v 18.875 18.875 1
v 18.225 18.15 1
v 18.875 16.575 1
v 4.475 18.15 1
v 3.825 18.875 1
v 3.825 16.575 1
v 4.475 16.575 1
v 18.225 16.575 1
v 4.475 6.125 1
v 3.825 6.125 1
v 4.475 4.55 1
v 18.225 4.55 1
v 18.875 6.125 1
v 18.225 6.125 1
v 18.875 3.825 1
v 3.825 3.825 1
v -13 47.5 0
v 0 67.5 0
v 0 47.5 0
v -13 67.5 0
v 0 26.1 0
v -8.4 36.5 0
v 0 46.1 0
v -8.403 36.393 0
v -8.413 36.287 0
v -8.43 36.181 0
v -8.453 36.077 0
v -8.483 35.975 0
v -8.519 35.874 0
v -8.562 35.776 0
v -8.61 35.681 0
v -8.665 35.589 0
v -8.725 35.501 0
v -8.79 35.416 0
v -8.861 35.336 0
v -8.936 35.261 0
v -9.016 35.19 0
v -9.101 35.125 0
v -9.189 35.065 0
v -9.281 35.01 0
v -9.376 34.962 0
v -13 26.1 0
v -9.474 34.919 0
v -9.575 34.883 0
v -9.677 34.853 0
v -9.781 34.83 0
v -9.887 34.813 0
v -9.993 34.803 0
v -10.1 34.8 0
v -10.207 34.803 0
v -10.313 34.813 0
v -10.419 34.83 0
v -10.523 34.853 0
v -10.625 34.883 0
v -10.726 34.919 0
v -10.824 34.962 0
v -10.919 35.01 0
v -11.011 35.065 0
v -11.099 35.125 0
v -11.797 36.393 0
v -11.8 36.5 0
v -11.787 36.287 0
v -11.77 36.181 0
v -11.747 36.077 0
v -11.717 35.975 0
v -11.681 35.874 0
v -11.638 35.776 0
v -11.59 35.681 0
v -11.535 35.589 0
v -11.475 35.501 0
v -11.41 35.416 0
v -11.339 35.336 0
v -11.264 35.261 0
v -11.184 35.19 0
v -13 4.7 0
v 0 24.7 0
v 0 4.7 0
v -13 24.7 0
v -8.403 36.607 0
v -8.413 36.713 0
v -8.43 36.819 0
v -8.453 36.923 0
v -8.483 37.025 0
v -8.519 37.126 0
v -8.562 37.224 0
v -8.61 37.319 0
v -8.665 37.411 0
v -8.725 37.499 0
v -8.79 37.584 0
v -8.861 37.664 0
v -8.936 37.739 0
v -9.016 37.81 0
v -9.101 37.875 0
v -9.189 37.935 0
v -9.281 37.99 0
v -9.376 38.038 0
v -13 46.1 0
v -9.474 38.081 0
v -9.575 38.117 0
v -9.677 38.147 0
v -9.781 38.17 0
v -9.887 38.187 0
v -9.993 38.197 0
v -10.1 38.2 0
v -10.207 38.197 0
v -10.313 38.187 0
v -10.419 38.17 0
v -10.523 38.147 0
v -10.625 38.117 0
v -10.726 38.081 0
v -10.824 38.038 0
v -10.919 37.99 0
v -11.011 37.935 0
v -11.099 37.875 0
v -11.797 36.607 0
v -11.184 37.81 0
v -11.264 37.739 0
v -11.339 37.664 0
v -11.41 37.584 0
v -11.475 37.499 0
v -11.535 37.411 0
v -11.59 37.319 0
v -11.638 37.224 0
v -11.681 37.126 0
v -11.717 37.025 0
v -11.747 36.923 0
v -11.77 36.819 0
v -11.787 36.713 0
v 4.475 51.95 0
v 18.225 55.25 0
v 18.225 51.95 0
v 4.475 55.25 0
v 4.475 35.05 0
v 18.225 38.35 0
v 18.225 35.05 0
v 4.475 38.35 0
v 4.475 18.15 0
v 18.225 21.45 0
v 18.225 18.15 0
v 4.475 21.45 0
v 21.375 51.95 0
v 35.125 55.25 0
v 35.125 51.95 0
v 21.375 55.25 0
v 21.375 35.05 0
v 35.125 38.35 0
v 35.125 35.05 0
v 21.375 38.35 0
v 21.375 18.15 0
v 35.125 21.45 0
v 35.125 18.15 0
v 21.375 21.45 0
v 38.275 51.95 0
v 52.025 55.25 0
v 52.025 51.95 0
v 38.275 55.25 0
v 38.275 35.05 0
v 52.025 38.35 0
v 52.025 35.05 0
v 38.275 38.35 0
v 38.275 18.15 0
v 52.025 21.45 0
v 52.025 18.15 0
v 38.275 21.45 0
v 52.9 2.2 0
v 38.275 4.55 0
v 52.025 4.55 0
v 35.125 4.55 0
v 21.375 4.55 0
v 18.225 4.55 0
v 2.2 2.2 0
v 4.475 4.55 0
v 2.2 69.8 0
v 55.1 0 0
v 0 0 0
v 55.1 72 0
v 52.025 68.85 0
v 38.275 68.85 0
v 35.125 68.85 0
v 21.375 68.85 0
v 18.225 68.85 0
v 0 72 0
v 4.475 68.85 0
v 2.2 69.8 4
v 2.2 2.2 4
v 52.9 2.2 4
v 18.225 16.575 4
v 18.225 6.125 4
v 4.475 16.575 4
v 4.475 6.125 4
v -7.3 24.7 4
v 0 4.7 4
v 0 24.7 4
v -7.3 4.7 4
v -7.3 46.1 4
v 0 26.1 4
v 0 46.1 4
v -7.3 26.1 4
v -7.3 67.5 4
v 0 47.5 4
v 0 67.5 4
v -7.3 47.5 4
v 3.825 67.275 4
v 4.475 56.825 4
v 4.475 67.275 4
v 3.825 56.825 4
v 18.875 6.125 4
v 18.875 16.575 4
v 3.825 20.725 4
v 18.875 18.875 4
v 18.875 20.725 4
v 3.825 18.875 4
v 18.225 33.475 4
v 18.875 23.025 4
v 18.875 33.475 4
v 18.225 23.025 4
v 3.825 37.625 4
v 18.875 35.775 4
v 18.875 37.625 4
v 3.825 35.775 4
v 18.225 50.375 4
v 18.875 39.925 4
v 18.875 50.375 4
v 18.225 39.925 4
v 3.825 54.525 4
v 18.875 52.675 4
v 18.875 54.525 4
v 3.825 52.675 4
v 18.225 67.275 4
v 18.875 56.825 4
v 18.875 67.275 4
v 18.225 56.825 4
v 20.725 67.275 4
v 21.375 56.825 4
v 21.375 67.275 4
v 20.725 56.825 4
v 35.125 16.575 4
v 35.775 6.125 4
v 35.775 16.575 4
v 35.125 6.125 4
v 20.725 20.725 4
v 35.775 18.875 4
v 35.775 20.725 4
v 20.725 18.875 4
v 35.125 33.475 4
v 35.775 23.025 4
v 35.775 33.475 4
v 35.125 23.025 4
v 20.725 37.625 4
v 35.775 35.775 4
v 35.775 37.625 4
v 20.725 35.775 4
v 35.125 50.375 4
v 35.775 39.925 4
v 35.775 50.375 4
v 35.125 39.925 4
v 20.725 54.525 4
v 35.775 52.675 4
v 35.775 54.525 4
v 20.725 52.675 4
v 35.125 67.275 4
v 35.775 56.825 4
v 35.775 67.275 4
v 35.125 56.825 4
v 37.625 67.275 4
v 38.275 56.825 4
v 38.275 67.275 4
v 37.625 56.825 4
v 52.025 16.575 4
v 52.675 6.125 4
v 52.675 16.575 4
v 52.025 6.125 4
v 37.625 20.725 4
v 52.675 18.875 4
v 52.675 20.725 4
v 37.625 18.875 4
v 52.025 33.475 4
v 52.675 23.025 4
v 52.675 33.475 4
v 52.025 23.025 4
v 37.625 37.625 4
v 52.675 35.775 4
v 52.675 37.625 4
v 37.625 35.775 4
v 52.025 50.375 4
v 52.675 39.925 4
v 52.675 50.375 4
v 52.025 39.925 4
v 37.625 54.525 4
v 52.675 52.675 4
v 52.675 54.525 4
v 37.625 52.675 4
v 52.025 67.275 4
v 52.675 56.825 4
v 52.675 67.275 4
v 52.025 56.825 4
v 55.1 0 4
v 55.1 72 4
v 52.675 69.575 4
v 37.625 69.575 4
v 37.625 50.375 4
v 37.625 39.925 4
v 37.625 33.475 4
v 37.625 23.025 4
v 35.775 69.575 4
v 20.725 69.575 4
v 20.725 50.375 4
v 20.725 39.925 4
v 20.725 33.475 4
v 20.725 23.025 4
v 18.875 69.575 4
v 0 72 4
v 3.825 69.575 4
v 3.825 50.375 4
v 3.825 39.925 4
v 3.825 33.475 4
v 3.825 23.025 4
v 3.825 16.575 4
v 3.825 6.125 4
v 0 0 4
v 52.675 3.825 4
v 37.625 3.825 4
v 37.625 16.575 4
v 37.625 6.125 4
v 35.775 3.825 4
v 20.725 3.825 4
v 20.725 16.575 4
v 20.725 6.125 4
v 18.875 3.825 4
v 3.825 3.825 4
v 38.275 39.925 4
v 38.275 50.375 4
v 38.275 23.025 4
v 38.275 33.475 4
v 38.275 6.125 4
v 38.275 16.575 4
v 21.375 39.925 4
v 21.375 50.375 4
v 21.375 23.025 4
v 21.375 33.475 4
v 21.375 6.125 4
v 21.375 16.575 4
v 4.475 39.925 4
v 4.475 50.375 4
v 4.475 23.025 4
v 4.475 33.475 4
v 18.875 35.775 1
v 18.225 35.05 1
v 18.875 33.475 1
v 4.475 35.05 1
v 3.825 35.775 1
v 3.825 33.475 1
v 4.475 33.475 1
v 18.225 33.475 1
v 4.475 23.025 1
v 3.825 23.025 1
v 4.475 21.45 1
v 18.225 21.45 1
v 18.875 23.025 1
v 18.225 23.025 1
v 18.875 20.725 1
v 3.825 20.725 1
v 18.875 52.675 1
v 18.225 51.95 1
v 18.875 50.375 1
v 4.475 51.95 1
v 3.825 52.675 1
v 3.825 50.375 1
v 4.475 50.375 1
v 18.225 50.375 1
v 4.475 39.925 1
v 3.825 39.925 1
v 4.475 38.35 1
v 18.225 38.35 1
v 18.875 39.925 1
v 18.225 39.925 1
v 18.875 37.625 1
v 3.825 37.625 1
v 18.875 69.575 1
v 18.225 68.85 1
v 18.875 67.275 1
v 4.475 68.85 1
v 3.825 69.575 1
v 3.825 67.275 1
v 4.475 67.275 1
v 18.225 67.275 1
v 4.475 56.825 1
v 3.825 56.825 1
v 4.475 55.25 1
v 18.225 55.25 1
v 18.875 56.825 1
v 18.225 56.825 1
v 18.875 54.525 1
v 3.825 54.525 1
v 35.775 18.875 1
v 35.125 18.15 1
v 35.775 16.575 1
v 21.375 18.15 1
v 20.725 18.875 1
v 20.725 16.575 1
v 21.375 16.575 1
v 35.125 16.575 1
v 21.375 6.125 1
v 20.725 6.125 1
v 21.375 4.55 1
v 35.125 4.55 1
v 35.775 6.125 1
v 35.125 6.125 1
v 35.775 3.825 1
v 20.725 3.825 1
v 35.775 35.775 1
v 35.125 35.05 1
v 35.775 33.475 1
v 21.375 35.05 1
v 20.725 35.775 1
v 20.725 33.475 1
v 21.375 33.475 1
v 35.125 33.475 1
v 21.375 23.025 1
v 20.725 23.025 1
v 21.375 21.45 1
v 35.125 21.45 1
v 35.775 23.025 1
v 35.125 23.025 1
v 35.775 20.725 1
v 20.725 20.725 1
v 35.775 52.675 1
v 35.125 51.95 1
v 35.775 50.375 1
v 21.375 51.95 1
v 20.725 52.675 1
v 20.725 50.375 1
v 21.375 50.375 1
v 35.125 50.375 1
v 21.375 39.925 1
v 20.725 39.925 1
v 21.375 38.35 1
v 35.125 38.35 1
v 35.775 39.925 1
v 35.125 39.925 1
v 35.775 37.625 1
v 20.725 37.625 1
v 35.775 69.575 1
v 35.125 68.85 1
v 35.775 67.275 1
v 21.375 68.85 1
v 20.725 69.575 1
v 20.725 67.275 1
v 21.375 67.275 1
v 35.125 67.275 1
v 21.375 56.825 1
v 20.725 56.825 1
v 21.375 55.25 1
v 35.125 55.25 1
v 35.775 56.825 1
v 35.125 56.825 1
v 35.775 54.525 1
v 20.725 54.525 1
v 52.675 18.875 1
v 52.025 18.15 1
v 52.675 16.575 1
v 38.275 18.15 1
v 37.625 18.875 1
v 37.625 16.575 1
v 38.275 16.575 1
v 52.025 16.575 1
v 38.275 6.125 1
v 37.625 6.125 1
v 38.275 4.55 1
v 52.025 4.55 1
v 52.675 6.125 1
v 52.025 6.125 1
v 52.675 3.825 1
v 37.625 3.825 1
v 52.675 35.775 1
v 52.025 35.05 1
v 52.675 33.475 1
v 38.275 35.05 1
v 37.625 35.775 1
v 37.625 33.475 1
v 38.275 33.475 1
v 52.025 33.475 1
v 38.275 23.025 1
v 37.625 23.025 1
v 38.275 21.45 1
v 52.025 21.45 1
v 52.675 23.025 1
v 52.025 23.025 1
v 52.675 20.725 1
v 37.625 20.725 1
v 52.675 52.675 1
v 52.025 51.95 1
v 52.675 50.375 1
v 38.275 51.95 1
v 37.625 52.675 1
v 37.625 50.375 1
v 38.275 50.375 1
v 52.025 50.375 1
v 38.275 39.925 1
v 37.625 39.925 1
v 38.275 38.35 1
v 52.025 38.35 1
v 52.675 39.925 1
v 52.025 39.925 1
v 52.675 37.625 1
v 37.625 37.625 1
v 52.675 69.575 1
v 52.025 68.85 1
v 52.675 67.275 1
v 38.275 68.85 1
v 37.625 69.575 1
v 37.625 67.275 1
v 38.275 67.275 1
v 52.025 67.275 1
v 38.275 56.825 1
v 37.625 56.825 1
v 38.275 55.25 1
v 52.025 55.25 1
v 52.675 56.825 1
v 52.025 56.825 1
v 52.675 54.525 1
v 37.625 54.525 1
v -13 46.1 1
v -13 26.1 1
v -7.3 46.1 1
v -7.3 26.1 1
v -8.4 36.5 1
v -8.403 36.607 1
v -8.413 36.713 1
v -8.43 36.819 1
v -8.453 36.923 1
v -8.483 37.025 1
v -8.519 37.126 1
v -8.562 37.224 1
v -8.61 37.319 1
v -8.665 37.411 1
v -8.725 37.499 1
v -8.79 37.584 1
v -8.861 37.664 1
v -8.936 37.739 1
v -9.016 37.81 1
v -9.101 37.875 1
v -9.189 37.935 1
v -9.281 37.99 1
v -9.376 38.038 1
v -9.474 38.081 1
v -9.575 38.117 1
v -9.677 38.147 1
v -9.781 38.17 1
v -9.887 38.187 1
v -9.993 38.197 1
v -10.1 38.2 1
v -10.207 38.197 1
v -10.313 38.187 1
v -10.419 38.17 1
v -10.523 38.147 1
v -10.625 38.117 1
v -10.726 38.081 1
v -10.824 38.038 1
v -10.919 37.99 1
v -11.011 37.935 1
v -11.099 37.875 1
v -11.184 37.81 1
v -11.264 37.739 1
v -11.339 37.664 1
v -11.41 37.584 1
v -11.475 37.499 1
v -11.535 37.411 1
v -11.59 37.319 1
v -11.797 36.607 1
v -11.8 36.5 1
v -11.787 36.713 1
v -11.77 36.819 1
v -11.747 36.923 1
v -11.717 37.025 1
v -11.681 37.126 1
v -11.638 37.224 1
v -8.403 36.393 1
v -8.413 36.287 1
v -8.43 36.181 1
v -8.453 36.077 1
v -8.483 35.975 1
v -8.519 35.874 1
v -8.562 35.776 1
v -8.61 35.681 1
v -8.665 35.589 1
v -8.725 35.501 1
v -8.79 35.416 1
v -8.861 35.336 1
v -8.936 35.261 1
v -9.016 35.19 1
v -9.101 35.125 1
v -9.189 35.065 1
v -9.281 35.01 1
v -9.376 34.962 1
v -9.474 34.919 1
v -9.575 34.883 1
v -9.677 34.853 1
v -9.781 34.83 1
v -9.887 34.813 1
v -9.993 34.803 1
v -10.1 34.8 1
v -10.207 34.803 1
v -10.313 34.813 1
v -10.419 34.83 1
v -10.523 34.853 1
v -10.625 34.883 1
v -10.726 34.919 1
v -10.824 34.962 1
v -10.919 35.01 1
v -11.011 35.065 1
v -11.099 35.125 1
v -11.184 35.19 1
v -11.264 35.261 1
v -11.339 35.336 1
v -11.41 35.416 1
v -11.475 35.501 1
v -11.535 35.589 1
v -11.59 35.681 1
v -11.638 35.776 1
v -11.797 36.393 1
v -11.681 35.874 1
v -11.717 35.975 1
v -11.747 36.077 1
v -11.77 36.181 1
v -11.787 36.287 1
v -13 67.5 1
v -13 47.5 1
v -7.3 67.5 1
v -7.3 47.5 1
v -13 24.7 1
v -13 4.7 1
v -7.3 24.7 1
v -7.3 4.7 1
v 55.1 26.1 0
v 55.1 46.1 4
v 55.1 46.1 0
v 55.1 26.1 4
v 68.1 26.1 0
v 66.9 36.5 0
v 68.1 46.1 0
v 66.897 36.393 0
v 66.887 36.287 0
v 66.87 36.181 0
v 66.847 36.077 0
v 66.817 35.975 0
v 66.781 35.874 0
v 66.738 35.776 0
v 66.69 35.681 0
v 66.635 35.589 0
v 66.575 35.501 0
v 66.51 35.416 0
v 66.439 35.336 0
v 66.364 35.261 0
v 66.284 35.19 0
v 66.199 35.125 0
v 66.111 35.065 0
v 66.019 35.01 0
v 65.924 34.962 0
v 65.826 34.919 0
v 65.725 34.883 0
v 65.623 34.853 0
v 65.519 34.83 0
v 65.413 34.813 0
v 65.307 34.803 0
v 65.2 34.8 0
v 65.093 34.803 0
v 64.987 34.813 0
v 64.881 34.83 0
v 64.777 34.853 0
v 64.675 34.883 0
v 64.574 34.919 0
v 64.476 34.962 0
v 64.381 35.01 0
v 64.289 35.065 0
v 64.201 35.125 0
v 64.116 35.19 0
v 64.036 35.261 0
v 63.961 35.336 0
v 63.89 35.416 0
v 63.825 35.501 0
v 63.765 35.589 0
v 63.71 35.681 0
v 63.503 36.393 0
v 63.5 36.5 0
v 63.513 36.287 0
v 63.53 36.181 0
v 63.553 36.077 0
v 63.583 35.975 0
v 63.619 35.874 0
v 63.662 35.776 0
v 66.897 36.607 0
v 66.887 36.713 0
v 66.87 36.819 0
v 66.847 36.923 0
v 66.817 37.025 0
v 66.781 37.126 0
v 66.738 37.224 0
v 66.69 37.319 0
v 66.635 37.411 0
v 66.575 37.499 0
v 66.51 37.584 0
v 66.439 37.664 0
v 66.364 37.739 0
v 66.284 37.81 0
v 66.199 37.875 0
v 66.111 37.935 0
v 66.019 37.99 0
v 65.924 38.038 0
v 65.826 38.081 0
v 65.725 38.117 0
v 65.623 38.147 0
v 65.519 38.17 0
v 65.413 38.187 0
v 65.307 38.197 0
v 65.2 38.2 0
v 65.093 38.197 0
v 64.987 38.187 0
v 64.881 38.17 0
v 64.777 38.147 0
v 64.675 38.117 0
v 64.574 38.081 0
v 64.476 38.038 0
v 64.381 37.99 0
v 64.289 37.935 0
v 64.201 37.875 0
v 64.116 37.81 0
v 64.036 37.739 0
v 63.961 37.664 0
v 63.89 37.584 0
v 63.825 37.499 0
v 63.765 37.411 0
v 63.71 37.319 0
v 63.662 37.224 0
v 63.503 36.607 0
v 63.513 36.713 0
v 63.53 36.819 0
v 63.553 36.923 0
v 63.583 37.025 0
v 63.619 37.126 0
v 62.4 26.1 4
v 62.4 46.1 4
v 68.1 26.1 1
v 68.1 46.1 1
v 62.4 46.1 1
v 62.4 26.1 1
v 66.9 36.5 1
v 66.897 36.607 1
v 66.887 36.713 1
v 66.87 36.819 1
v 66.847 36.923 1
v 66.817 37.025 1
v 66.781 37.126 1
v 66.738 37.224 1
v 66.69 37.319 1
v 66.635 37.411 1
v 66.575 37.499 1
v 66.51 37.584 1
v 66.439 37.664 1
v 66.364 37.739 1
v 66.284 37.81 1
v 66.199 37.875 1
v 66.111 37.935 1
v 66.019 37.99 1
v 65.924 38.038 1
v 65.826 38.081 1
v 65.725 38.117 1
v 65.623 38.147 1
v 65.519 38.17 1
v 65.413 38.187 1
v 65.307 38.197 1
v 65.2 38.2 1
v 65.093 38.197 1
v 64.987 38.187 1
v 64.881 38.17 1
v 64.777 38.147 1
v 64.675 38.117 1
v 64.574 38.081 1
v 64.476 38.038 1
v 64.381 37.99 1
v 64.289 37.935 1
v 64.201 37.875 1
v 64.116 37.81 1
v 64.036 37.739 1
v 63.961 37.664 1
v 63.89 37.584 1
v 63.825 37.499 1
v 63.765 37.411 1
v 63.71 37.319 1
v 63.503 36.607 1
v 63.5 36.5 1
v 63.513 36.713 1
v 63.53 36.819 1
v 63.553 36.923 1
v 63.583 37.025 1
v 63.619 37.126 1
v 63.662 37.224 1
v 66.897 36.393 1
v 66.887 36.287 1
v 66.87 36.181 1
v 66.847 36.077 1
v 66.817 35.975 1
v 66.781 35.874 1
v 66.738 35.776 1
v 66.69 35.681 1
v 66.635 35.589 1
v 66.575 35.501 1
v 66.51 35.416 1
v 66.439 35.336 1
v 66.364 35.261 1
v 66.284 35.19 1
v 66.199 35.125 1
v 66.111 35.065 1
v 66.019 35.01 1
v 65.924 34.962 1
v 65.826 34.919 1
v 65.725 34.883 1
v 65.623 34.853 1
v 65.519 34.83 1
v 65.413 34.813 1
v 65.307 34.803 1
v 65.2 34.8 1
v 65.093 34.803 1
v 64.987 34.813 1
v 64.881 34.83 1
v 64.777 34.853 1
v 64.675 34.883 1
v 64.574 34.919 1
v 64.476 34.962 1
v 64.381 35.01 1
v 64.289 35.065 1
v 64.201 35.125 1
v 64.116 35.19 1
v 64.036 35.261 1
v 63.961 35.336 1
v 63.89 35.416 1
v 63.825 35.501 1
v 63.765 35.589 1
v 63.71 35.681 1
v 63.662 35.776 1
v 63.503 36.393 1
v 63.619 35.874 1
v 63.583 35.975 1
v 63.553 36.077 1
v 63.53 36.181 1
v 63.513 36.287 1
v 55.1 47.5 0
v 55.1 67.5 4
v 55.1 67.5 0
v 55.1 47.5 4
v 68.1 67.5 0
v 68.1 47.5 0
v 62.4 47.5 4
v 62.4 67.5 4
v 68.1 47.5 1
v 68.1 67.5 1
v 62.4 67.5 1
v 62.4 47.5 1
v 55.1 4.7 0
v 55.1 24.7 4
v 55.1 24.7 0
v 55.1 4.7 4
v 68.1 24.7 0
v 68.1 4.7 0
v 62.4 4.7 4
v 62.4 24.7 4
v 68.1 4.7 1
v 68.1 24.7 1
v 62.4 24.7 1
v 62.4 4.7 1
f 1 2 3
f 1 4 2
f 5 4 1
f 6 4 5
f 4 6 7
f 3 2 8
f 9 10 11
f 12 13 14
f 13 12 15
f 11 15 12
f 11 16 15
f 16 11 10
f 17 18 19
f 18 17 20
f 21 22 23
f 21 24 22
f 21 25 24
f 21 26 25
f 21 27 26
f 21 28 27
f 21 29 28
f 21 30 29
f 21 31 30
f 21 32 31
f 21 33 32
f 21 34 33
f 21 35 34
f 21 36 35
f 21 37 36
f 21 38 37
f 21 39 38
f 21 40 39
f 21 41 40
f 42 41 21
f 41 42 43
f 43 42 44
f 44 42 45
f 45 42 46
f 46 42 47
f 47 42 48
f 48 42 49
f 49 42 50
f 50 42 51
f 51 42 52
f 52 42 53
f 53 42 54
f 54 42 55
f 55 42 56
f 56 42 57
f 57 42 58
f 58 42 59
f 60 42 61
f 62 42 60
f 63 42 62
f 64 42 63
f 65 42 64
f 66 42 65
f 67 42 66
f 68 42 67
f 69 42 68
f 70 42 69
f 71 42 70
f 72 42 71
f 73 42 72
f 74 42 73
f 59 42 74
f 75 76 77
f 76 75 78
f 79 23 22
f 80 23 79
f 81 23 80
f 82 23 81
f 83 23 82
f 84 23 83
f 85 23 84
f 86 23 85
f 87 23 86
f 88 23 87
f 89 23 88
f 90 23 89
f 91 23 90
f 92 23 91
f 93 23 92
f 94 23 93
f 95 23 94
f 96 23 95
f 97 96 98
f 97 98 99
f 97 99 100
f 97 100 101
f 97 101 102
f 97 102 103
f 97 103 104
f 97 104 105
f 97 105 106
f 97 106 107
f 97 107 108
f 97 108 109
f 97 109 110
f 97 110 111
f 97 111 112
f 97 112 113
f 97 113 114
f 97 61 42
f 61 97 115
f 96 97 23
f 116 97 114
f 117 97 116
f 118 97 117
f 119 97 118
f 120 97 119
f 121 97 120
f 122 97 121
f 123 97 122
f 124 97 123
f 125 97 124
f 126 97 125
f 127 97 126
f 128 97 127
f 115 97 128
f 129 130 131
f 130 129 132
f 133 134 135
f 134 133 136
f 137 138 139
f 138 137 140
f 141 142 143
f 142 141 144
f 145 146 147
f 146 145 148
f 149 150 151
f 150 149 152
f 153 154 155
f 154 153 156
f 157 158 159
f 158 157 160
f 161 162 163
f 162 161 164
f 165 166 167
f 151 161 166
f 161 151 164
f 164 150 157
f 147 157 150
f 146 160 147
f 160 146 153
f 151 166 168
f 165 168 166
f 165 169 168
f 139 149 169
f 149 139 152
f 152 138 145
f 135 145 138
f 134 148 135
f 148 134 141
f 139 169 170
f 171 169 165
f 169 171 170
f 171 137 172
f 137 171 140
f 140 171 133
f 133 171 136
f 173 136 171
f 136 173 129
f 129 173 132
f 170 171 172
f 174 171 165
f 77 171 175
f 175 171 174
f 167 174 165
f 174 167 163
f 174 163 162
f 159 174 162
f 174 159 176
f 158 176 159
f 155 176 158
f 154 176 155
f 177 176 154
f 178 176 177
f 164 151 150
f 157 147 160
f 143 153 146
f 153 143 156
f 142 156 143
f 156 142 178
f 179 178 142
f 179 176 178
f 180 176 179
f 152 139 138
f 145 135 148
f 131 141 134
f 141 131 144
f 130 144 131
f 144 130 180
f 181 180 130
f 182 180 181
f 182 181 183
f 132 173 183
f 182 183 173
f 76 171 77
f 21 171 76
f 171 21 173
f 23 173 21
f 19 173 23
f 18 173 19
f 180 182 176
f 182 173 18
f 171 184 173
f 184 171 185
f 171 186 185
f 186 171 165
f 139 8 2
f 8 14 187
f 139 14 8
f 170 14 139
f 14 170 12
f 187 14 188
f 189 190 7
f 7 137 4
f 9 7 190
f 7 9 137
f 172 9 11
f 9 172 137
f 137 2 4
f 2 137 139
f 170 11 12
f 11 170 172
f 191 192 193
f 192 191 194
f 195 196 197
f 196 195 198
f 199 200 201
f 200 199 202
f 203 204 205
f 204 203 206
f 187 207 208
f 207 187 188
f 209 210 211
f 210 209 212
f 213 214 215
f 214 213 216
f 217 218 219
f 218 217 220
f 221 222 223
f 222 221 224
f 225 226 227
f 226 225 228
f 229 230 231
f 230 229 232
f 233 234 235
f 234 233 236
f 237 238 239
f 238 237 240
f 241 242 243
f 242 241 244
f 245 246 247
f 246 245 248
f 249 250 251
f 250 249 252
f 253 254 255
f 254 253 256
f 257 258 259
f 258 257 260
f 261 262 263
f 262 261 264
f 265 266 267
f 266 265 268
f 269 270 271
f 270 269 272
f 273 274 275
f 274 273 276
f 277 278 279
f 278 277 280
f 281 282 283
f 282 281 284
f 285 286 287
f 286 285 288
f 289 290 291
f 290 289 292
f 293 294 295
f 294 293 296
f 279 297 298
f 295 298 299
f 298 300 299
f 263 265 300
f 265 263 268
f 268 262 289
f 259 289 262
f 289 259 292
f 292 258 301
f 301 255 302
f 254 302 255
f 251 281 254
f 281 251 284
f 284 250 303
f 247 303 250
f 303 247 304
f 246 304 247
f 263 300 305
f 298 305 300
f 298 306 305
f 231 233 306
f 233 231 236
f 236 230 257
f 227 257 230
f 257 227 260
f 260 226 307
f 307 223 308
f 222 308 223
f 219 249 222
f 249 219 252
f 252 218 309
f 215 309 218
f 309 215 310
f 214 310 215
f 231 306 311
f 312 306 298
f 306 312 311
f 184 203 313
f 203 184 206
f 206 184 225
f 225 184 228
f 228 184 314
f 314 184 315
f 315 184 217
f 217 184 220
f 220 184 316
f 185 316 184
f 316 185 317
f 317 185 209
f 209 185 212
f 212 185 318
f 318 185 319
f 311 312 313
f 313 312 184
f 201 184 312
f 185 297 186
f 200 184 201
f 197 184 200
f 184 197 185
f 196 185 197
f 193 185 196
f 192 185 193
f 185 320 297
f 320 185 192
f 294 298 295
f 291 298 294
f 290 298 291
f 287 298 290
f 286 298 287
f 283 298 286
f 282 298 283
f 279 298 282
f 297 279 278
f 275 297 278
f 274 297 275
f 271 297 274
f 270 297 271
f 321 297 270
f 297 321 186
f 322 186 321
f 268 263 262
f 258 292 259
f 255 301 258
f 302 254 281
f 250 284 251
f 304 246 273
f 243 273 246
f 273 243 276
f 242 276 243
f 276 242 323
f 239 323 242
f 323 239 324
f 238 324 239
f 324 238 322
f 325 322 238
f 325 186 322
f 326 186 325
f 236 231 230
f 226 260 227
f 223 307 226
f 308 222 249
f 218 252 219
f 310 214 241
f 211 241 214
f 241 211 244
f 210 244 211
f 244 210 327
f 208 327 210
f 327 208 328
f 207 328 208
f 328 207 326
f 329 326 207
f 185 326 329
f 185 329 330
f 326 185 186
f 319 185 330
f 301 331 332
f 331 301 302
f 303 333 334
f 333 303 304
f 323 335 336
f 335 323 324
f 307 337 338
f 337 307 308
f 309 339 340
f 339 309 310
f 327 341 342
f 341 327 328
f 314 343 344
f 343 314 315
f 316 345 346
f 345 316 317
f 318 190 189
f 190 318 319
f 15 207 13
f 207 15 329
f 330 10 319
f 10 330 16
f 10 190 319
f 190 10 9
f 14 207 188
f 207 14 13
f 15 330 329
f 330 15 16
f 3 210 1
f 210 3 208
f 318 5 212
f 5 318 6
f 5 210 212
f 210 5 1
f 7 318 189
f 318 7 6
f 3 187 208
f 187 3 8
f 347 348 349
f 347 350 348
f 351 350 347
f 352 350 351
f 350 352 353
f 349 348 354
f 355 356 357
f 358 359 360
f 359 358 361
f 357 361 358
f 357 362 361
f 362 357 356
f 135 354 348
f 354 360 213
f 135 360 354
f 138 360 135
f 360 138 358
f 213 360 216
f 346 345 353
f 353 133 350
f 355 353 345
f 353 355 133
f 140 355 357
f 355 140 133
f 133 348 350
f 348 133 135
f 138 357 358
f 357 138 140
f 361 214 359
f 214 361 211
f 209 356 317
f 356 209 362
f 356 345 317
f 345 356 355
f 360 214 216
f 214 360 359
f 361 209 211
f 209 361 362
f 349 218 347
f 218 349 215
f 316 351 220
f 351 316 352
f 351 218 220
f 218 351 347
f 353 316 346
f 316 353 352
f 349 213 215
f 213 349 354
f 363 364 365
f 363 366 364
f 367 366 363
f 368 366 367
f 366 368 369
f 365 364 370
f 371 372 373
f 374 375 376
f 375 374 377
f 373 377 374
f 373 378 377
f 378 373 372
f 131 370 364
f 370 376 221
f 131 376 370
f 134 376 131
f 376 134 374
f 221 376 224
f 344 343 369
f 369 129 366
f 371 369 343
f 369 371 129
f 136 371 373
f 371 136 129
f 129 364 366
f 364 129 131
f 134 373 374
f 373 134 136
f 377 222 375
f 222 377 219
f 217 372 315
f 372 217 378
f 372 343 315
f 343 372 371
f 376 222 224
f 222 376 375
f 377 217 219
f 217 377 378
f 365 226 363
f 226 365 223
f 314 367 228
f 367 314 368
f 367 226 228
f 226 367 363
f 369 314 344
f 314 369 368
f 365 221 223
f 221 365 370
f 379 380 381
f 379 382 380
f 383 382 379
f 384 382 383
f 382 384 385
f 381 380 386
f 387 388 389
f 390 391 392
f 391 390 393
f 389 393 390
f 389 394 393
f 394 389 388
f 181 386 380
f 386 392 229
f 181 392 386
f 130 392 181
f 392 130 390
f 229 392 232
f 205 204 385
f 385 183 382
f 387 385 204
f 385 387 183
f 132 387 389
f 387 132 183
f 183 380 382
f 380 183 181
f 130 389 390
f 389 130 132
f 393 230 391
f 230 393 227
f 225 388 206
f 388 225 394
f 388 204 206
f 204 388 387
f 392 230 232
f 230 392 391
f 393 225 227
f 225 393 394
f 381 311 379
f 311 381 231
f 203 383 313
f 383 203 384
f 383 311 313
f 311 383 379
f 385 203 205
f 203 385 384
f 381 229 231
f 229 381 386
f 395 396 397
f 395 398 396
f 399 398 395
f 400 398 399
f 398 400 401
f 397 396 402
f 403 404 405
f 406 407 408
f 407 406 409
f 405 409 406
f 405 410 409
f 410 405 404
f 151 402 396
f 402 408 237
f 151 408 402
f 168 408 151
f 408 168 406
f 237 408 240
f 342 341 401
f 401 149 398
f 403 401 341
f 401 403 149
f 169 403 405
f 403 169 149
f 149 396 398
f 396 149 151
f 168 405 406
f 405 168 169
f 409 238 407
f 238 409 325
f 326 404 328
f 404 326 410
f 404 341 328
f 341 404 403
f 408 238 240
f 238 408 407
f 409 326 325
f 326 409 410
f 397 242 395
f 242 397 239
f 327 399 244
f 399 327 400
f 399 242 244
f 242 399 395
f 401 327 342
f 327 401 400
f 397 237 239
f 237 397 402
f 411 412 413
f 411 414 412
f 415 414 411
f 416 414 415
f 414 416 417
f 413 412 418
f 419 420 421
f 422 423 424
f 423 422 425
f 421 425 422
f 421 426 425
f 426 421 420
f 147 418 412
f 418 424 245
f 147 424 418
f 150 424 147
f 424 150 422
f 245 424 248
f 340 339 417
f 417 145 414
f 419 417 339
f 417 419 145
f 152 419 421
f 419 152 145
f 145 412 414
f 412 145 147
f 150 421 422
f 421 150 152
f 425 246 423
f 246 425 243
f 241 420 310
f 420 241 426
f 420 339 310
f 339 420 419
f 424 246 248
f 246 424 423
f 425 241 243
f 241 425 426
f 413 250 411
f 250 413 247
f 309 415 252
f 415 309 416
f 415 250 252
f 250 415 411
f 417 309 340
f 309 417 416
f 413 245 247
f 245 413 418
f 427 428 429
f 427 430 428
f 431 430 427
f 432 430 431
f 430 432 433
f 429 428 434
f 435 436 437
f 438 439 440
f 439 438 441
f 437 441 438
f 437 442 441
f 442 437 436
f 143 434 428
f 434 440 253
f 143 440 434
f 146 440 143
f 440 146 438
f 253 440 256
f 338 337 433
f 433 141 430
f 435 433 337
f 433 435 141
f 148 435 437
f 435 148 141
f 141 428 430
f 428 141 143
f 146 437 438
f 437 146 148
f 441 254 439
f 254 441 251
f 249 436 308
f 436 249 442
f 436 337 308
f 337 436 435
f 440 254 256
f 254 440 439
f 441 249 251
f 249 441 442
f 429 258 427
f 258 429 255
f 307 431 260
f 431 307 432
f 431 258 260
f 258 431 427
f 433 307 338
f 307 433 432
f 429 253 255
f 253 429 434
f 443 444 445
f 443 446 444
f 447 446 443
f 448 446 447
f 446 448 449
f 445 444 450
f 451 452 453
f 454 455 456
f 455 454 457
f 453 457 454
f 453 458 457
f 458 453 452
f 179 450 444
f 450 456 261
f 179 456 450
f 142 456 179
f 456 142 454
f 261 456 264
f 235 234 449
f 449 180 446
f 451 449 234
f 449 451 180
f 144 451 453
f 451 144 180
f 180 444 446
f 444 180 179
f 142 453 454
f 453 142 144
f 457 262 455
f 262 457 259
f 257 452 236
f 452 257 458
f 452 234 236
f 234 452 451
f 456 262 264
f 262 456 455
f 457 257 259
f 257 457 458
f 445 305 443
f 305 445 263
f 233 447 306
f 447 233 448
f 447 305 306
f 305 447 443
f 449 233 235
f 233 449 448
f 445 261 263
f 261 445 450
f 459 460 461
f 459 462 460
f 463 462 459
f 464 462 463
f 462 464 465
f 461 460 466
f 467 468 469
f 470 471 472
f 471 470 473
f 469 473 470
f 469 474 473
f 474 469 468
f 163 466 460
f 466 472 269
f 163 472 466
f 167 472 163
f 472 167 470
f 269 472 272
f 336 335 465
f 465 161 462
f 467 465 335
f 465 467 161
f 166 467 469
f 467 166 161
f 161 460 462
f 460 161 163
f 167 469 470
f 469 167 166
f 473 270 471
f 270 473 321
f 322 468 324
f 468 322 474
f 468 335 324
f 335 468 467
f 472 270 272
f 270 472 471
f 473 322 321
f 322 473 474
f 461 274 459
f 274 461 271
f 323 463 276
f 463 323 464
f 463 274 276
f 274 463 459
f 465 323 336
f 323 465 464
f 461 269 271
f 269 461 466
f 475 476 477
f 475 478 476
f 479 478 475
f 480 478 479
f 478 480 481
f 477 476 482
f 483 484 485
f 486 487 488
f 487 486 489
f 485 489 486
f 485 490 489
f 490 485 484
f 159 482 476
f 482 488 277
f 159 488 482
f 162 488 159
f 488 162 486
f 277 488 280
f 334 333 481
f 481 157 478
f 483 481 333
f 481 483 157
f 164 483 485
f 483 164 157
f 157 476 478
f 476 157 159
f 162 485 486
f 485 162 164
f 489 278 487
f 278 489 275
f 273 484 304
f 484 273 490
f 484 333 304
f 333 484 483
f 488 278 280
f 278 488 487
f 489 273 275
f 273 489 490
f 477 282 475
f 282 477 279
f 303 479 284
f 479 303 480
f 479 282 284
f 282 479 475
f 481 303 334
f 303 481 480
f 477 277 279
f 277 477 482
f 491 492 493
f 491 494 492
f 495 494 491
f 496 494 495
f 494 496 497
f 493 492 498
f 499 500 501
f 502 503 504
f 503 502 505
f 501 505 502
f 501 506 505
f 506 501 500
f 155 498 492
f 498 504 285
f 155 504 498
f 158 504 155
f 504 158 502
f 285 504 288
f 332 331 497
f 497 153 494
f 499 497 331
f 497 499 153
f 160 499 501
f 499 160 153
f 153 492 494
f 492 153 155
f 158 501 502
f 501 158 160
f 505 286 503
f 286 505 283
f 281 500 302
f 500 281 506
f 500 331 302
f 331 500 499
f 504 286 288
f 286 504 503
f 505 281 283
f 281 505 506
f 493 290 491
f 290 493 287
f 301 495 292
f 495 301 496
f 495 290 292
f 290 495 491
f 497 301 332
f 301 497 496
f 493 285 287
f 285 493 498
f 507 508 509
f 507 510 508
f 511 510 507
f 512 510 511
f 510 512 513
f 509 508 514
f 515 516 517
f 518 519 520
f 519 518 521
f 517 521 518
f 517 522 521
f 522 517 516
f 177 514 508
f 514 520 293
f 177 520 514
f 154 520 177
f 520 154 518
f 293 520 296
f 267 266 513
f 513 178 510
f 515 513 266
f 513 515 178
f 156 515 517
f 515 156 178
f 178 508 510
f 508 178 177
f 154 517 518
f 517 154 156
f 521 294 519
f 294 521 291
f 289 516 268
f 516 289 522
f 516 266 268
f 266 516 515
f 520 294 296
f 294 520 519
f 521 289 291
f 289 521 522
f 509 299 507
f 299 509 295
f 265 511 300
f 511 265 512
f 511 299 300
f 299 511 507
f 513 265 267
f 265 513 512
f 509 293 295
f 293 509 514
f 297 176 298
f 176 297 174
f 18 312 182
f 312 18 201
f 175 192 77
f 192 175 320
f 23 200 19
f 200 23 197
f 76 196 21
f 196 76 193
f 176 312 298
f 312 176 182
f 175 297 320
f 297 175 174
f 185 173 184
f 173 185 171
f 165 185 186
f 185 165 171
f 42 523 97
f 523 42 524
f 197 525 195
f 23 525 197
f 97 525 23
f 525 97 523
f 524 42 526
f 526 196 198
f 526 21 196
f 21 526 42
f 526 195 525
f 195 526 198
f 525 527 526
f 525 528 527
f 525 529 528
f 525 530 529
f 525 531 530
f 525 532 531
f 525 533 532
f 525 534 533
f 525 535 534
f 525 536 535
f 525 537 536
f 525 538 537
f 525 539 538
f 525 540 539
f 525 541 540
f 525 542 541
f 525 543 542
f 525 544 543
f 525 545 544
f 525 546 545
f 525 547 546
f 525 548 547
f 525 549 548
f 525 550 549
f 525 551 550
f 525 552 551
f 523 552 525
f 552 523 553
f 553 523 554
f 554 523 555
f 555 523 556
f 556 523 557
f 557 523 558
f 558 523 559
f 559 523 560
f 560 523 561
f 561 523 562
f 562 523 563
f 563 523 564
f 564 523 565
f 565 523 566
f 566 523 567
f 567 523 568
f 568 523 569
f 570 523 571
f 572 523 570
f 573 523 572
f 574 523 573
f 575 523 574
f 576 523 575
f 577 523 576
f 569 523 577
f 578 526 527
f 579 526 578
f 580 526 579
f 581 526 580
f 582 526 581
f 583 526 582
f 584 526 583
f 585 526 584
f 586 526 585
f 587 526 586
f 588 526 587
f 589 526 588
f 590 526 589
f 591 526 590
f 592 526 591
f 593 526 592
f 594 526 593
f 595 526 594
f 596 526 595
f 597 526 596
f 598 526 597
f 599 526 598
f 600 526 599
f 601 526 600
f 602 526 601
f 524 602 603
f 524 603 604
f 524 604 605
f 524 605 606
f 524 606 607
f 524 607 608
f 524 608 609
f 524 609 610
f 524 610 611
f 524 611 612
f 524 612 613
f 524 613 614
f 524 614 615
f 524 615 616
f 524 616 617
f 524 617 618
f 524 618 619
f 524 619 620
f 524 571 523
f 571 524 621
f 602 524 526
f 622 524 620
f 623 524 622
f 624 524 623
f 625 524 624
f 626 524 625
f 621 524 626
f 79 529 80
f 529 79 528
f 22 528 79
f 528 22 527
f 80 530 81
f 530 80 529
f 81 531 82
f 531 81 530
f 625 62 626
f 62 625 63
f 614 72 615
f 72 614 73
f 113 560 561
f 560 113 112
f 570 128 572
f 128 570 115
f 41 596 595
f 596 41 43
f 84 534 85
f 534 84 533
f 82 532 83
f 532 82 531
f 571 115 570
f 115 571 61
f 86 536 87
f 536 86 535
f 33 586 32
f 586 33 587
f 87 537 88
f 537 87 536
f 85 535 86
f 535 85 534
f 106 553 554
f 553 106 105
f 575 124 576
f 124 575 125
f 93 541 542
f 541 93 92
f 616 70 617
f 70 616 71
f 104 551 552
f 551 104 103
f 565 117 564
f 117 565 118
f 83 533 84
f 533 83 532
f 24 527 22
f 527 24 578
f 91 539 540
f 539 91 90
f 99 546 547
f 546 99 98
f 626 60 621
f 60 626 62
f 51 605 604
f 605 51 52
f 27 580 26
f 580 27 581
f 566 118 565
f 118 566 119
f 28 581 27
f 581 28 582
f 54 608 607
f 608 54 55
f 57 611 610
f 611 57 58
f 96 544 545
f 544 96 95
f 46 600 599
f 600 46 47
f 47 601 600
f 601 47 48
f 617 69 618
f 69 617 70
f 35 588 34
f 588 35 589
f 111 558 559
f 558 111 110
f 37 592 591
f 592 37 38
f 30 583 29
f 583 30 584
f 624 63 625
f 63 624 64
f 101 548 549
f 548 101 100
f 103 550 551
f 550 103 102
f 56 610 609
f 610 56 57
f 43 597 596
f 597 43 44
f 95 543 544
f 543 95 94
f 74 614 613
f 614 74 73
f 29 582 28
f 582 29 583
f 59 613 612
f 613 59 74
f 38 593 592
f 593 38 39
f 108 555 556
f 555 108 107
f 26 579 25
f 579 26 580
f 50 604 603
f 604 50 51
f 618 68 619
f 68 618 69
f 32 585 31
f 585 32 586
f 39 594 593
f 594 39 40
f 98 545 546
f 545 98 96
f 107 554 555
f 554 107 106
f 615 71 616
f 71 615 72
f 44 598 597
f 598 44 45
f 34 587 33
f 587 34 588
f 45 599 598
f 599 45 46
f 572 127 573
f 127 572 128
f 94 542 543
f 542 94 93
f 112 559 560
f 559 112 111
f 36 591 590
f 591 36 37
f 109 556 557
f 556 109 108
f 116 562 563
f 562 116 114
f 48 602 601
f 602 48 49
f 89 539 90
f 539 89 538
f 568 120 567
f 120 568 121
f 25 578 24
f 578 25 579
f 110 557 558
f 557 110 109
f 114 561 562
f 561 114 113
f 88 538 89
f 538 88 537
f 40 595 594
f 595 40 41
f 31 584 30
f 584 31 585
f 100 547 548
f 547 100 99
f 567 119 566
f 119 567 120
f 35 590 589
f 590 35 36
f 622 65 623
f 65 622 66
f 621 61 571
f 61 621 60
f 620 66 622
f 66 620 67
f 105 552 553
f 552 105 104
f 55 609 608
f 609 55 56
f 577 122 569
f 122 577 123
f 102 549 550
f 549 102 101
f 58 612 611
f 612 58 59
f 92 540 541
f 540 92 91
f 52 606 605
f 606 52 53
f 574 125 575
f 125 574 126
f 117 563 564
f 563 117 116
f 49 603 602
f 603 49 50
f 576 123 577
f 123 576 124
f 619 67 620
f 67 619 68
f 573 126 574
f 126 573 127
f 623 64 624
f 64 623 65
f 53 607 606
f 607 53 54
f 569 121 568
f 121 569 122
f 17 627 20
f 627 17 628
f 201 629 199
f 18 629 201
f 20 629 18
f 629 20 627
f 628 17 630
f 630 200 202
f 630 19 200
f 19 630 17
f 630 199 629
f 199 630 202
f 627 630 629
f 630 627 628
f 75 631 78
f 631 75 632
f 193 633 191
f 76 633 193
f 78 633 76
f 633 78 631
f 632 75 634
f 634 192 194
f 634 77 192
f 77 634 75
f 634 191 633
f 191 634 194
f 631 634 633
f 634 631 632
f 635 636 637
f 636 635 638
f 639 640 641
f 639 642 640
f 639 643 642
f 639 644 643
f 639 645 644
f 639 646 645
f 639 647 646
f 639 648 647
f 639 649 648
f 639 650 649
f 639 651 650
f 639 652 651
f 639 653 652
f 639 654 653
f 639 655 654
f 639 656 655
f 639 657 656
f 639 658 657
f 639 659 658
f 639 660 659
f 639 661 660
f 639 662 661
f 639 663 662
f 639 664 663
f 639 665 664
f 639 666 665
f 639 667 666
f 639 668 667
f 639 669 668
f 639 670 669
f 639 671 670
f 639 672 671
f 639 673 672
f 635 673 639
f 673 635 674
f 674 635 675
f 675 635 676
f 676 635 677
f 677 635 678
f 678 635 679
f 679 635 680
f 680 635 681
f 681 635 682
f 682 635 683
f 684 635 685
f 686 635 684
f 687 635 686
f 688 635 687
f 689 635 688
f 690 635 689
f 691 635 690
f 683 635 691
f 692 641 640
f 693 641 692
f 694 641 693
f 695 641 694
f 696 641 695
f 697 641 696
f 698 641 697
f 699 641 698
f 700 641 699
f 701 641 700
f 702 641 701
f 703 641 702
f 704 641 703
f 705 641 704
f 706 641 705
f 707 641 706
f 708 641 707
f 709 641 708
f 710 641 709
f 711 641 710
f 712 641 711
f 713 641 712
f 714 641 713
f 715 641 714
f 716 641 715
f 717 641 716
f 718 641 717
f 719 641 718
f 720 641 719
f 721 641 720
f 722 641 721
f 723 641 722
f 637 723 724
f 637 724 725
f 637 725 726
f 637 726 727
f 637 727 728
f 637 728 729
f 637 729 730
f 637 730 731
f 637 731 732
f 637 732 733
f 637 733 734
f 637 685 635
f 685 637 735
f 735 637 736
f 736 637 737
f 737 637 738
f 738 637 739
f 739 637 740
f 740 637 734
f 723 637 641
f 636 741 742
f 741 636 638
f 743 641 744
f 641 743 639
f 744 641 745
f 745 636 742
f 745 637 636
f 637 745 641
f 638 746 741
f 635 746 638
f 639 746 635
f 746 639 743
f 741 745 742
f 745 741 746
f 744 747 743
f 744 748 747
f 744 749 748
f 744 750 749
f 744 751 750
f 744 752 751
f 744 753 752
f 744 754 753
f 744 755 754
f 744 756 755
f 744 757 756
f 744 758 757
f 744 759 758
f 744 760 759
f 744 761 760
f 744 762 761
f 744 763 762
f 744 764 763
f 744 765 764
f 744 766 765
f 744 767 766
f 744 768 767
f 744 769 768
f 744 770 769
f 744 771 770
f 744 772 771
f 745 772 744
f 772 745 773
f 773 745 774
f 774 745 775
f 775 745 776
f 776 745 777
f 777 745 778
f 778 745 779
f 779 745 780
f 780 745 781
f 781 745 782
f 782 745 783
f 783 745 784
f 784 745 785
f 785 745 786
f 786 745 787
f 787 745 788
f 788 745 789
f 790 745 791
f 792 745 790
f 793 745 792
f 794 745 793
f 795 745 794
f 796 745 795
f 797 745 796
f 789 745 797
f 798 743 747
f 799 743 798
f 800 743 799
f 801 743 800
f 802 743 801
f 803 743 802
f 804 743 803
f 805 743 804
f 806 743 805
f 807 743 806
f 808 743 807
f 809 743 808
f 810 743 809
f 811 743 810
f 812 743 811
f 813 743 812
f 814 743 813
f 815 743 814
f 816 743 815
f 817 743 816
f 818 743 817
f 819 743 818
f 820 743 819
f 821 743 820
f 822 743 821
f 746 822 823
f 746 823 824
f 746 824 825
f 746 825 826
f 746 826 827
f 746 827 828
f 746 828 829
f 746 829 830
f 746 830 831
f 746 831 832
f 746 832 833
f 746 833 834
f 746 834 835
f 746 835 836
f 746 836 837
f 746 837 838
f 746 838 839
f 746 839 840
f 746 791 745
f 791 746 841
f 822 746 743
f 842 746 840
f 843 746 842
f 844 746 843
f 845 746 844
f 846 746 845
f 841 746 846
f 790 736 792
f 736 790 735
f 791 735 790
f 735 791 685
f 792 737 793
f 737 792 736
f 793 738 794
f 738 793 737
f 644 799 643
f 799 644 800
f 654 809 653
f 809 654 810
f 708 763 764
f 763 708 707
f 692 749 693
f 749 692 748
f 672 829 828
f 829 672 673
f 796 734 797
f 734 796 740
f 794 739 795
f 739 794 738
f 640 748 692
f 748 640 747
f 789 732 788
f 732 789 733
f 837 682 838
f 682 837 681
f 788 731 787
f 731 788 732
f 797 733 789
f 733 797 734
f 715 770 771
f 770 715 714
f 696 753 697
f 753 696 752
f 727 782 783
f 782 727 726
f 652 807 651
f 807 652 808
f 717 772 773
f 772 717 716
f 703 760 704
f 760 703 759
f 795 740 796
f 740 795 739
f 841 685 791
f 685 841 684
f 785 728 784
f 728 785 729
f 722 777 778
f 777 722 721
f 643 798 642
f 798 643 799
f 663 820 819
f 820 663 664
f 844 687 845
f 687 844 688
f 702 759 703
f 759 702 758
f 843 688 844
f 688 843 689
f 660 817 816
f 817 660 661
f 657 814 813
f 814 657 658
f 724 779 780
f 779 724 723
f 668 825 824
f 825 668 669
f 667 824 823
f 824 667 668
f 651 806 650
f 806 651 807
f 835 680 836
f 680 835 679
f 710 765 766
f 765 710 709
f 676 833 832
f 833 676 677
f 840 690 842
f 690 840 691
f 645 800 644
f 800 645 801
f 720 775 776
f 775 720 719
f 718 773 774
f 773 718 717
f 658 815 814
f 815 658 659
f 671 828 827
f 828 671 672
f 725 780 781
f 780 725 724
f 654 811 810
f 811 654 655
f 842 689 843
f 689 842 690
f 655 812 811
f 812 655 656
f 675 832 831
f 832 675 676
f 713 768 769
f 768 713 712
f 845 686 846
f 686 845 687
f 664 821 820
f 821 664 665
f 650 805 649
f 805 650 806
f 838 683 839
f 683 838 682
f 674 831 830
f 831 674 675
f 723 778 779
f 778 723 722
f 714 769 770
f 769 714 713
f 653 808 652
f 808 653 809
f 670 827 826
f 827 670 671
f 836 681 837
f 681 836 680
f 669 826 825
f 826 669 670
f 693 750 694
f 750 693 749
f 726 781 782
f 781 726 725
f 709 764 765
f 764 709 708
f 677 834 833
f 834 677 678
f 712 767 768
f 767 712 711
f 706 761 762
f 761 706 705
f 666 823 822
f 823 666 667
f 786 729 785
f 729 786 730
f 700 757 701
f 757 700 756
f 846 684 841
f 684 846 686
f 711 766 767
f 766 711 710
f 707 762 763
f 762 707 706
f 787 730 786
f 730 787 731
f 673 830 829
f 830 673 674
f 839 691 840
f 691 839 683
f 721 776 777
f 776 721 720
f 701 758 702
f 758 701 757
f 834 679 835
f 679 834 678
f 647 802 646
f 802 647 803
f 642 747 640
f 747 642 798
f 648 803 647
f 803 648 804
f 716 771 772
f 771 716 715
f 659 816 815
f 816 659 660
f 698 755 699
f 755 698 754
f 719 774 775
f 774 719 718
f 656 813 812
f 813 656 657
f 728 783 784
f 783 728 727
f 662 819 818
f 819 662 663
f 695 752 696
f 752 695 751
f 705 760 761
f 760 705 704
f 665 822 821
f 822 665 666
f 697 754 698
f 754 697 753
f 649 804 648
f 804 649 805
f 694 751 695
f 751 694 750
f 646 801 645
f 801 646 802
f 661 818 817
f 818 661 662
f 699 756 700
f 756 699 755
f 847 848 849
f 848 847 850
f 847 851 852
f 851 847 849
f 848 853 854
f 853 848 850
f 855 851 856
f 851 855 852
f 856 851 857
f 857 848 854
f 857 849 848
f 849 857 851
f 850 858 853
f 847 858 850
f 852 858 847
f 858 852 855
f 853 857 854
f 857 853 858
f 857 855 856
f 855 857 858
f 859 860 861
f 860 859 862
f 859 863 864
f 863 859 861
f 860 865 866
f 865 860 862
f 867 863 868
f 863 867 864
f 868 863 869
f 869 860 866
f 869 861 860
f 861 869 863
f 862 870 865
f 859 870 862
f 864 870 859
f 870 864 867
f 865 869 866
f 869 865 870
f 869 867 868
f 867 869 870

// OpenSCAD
// outer square dimensions
os=18.3;

// the thickness of the interior button walls. 
wall_width=1.40;


// This is the "outer square" for a grid of buttons that respects
// the wall_width between each button.
grid_os=(os - wall_width);

//  TOP VIEW OF KEY BUTTON
// ==================================================
//
//  *-----------------*  --.
//   \-----[   ]-----/    |      <--- top right corner ("dips in")
//   |---------------|    |
//   |---------------|    |
//   |---------------|     > 13.60 mm
//   |---------------|    |
//   |---------------|    |
//   /---------------\    |
//  *-----------------*  --.
//
//  |                 |
//  .--------v--------.
//        13.75 mm

under_lip_width=13.75;
under_lip_height=13.60;
under_lip_depth=1; // the clips "snap" onto this.


// ==================================================
//
//
//  . . . -----------------._      ---\
//                           \         |
//                           |          >  2.30 mm
//                          _|         |
//                         |     -----/
//                         |
//                         |
//                         |
//                         |   <--- what we want to "fill in" on the upper layer
//
//  \_. . ._______________/
//             v
//          13.75 mm

lip_height=15.05;
lip_width=15.05;
wall_height=3;
dip_height=2.3;

grid_columns=3;
grid_rows=4;

// point that's center to the grid on the columns
center_x = ((grid_os * grid_columns - 1) / 2);
center_y =((grid_os * grid_rows - 1) / 2);


grid_without_border_width=(grid_os * grid_columns);
grid_without_border_height=(grid_os * grid_rows);

// This adds a "border shim" around the entire grid so it fits flush with
// the phone we're working with.

extra_border_padding=1.5;
border_width=((wall_width / 2) + extra_border_padding);

translate([ border_width, border_width, 0 ])
union() {
        
    for (offset_x=[0:grid_os:(grid_os * grid_columns - 1)]) {
        for (offset_y=[0:grid_os:(grid_os * grid_rows - 1)]) {
            translate([ offset_x, offset_y ]) union() {
                difference() {
                    cube([ os, os, under_lip_depth ]);
                    translate([ (os - under_lip_width) / 2, (os - under_lip_height) / 2, 0 ]) {
                        cube([ under_lip_width, under_lip_height, under_lip_depth ]);
                    }
                }

                translate([ 0, 0, under_lip_depth ]) difference() {
                    cube([ os, os, wall_height ]);
                    
                    translate([ (os - under_lip_width) / 2, (os - under_lip_height) / 2, 0 ]) {
                        cube([ under_lip_width, under_lip_height, wall_height ]);
                    };
                    
                    translate([ (os - lip_width) / 2, (os - lip_height) / 2, 0 ]) {
                        cube([ lip_width, dip_height, wall_height ]);
                    };
                    
                    translate([0, lip_height - dip_height, 0]) 
                    translate([ (os - lip_width) / 2, (os - lip_height) / 2, 0 ]) {
                        cube([ lip_width, dip_height, wall_height ]);
                    };
                    
                }
            }
        }
    }
}


//-----------------------------------------------------------
// This is the border around the grid
difference() {
    cube([ 
        grid_without_border_width + (border_width * 2), 
        grid_without_border_height + (border_width * 2),
        (wall_height + 1) 
    ]);
    
    // This is the size of the grid as a solid cube
    translate([ border_width, border_width, 0 ])
    cube([ grid_without_border_width, grid_without_border_height, wall_height + 1 ]);
}

// This is the border around the grid
* difference() {
    translate([ 
        (border_width) * -1, 
        (border_width) * -1,
        0
    ]) cube([ 
        (grid_os * grid_columns) + wall_width + (extra_border_padding * 2), 
        (grid_os * grid_rows) + wall_width + (extra_border_padding * 2), 
        (wall_height + 1) 
    ]);
    
    // This is the size of the grid as a solid cube
    cube([ grid_os * grid_columns, grid_os * grid_rows, wall_height + 1 ]);
}


//-----------------------------------------------------------------------------
// This adds the "wings" that pop out and catch the bolt
// that secures this print to the phone istelf. 


wing_height=20;
wing_width_from_grid_edge_to_outer_edge=13;
wing_outer_edge_width=2;


outer_edge_to_inner_bolt_interior=5.7;
bolt_diameter=3.4;
bolt_radius=bolt_diameter/2;

translate([ 0, 0, wall_height + under_lip_depth ])
mirror([ 0, 0, 1 ])
translate([ 0, center_y, 0 ])
translate([ 0, wall_width * 2, 0 ])
union() {
    // LEFT WING (center)
    translate([ -1 * wing_width_from_grid_edge_to_outer_edge, -1 * (wing_height / 2), 0 ])
    difference() {
              cube([ 
                wing_width_from_grid_edge_to_outer_edge, 
                wing_height,
                wall_height + under_lip_depth
              ]);
        
            cube([
                outer_edge_to_inner_bolt_interior, 
                wing_height,
                wall_height
            ]);  
     
        translate([ 1.2 + bolt_radius, (wing_height / 2) + 0.4, 0 ]) // 0.2 "centers" bolt hole #lazy
            cylinder (h = wall_height * 100, r=bolt_radius, center = true, $fn=100);     
    }
    
    // LEFT WING (top)
    translate([ 0, wing_height + wall_width, 0 ])
    translate([ -1 * wing_width_from_grid_edge_to_outer_edge, -1 * (wing_height / 2), 0 ])
    difference() {
              cube([ 
                wing_width_from_grid_edge_to_outer_edge, 
                wing_height,
                wall_height + under_lip_depth
              ]);
        
            cube([
                outer_edge_to_inner_bolt_interior, 
                wing_height,
                wall_height
            ]);      
    }
    
     // LEFT WING (top)
    translate([ 0, -1 * (wing_height + wall_width), 0 ])
    translate([ -1 * wing_width_from_grid_edge_to_outer_edge, -1 * (wing_height / 2), 0 ])
    difference() {
              cube([ 
                wing_width_from_grid_edge_to_outer_edge, 
                wing_height,
                wall_height + under_lip_depth
              ]);
        
            cube([
                outer_edge_to_inner_bolt_interior, 
                wing_height,
                wall_height
            ]);      
    }
}


// RIGHT Wing
translate([ 0, 0, wall_height + under_lip_depth ])
mirror([ 0, 0, 1 ])
translate([ (border_width * 2) + grid_without_border_width, 0, 0 ])
mirror([ 1, 0, 0 ])
translate([ 0, center_y, 0 ])
translate([ 0, wall_width * 2, 0 ])
union() {

    translate([ -1 * wing_width_from_grid_edge_to_outer_edge, -1 * (wing_height / 2), 0 ])
    difference() {
              cube([ 
                wing_width_from_grid_edge_to_outer_edge, 
                wing_height,
                wall_height + under_lip_depth
              ]);
        
            cube([
                outer_edge_to_inner_bolt_interior, 
                wing_height,
                wall_height
            ]);  
  
        translate([ 1.2 + bolt_radius, (wing_height / 2) + 0.4, 0 ]) // 0.2 "centers" bolt hole #lazy
            cylinder (h = wall_height * 100, r=bolt_radius, center = true, $fn=100);        
    }
    
    translate([ 0, wing_height + wall_width, 0 ])
    translate([ -1 * wing_width_from_grid_edge_to_outer_edge, -1 * (wing_height / 2), 0 ])
    difference() {
              cube([ 
                wing_width_from_grid_edge_to_outer_edge, 
                wing_height,
                wall_height + under_lip_depth
              ]);
        
            cube([
                outer_edge_to_inner_bolt_interior, 
                wing_height,
                wall_height
            ]);      
    }
    
    translate([ 0, -1 * (wing_height + wall_width), 0 ])
    translate([ -1 * wing_width_from_grid_edge_to_outer_edge, -1 * (wing_height / 2), 0 ])
    difference() {
              cube([ 
                wing_width_from_grid_edge_to_outer_edge, 
                wing_height,
                wall_height + under_lip_depth
              ]);
        
            cube([
                outer_edge_to_inner_bolt_interior, 
                wing_height,
                wall_height
            ]);   
    }
}
